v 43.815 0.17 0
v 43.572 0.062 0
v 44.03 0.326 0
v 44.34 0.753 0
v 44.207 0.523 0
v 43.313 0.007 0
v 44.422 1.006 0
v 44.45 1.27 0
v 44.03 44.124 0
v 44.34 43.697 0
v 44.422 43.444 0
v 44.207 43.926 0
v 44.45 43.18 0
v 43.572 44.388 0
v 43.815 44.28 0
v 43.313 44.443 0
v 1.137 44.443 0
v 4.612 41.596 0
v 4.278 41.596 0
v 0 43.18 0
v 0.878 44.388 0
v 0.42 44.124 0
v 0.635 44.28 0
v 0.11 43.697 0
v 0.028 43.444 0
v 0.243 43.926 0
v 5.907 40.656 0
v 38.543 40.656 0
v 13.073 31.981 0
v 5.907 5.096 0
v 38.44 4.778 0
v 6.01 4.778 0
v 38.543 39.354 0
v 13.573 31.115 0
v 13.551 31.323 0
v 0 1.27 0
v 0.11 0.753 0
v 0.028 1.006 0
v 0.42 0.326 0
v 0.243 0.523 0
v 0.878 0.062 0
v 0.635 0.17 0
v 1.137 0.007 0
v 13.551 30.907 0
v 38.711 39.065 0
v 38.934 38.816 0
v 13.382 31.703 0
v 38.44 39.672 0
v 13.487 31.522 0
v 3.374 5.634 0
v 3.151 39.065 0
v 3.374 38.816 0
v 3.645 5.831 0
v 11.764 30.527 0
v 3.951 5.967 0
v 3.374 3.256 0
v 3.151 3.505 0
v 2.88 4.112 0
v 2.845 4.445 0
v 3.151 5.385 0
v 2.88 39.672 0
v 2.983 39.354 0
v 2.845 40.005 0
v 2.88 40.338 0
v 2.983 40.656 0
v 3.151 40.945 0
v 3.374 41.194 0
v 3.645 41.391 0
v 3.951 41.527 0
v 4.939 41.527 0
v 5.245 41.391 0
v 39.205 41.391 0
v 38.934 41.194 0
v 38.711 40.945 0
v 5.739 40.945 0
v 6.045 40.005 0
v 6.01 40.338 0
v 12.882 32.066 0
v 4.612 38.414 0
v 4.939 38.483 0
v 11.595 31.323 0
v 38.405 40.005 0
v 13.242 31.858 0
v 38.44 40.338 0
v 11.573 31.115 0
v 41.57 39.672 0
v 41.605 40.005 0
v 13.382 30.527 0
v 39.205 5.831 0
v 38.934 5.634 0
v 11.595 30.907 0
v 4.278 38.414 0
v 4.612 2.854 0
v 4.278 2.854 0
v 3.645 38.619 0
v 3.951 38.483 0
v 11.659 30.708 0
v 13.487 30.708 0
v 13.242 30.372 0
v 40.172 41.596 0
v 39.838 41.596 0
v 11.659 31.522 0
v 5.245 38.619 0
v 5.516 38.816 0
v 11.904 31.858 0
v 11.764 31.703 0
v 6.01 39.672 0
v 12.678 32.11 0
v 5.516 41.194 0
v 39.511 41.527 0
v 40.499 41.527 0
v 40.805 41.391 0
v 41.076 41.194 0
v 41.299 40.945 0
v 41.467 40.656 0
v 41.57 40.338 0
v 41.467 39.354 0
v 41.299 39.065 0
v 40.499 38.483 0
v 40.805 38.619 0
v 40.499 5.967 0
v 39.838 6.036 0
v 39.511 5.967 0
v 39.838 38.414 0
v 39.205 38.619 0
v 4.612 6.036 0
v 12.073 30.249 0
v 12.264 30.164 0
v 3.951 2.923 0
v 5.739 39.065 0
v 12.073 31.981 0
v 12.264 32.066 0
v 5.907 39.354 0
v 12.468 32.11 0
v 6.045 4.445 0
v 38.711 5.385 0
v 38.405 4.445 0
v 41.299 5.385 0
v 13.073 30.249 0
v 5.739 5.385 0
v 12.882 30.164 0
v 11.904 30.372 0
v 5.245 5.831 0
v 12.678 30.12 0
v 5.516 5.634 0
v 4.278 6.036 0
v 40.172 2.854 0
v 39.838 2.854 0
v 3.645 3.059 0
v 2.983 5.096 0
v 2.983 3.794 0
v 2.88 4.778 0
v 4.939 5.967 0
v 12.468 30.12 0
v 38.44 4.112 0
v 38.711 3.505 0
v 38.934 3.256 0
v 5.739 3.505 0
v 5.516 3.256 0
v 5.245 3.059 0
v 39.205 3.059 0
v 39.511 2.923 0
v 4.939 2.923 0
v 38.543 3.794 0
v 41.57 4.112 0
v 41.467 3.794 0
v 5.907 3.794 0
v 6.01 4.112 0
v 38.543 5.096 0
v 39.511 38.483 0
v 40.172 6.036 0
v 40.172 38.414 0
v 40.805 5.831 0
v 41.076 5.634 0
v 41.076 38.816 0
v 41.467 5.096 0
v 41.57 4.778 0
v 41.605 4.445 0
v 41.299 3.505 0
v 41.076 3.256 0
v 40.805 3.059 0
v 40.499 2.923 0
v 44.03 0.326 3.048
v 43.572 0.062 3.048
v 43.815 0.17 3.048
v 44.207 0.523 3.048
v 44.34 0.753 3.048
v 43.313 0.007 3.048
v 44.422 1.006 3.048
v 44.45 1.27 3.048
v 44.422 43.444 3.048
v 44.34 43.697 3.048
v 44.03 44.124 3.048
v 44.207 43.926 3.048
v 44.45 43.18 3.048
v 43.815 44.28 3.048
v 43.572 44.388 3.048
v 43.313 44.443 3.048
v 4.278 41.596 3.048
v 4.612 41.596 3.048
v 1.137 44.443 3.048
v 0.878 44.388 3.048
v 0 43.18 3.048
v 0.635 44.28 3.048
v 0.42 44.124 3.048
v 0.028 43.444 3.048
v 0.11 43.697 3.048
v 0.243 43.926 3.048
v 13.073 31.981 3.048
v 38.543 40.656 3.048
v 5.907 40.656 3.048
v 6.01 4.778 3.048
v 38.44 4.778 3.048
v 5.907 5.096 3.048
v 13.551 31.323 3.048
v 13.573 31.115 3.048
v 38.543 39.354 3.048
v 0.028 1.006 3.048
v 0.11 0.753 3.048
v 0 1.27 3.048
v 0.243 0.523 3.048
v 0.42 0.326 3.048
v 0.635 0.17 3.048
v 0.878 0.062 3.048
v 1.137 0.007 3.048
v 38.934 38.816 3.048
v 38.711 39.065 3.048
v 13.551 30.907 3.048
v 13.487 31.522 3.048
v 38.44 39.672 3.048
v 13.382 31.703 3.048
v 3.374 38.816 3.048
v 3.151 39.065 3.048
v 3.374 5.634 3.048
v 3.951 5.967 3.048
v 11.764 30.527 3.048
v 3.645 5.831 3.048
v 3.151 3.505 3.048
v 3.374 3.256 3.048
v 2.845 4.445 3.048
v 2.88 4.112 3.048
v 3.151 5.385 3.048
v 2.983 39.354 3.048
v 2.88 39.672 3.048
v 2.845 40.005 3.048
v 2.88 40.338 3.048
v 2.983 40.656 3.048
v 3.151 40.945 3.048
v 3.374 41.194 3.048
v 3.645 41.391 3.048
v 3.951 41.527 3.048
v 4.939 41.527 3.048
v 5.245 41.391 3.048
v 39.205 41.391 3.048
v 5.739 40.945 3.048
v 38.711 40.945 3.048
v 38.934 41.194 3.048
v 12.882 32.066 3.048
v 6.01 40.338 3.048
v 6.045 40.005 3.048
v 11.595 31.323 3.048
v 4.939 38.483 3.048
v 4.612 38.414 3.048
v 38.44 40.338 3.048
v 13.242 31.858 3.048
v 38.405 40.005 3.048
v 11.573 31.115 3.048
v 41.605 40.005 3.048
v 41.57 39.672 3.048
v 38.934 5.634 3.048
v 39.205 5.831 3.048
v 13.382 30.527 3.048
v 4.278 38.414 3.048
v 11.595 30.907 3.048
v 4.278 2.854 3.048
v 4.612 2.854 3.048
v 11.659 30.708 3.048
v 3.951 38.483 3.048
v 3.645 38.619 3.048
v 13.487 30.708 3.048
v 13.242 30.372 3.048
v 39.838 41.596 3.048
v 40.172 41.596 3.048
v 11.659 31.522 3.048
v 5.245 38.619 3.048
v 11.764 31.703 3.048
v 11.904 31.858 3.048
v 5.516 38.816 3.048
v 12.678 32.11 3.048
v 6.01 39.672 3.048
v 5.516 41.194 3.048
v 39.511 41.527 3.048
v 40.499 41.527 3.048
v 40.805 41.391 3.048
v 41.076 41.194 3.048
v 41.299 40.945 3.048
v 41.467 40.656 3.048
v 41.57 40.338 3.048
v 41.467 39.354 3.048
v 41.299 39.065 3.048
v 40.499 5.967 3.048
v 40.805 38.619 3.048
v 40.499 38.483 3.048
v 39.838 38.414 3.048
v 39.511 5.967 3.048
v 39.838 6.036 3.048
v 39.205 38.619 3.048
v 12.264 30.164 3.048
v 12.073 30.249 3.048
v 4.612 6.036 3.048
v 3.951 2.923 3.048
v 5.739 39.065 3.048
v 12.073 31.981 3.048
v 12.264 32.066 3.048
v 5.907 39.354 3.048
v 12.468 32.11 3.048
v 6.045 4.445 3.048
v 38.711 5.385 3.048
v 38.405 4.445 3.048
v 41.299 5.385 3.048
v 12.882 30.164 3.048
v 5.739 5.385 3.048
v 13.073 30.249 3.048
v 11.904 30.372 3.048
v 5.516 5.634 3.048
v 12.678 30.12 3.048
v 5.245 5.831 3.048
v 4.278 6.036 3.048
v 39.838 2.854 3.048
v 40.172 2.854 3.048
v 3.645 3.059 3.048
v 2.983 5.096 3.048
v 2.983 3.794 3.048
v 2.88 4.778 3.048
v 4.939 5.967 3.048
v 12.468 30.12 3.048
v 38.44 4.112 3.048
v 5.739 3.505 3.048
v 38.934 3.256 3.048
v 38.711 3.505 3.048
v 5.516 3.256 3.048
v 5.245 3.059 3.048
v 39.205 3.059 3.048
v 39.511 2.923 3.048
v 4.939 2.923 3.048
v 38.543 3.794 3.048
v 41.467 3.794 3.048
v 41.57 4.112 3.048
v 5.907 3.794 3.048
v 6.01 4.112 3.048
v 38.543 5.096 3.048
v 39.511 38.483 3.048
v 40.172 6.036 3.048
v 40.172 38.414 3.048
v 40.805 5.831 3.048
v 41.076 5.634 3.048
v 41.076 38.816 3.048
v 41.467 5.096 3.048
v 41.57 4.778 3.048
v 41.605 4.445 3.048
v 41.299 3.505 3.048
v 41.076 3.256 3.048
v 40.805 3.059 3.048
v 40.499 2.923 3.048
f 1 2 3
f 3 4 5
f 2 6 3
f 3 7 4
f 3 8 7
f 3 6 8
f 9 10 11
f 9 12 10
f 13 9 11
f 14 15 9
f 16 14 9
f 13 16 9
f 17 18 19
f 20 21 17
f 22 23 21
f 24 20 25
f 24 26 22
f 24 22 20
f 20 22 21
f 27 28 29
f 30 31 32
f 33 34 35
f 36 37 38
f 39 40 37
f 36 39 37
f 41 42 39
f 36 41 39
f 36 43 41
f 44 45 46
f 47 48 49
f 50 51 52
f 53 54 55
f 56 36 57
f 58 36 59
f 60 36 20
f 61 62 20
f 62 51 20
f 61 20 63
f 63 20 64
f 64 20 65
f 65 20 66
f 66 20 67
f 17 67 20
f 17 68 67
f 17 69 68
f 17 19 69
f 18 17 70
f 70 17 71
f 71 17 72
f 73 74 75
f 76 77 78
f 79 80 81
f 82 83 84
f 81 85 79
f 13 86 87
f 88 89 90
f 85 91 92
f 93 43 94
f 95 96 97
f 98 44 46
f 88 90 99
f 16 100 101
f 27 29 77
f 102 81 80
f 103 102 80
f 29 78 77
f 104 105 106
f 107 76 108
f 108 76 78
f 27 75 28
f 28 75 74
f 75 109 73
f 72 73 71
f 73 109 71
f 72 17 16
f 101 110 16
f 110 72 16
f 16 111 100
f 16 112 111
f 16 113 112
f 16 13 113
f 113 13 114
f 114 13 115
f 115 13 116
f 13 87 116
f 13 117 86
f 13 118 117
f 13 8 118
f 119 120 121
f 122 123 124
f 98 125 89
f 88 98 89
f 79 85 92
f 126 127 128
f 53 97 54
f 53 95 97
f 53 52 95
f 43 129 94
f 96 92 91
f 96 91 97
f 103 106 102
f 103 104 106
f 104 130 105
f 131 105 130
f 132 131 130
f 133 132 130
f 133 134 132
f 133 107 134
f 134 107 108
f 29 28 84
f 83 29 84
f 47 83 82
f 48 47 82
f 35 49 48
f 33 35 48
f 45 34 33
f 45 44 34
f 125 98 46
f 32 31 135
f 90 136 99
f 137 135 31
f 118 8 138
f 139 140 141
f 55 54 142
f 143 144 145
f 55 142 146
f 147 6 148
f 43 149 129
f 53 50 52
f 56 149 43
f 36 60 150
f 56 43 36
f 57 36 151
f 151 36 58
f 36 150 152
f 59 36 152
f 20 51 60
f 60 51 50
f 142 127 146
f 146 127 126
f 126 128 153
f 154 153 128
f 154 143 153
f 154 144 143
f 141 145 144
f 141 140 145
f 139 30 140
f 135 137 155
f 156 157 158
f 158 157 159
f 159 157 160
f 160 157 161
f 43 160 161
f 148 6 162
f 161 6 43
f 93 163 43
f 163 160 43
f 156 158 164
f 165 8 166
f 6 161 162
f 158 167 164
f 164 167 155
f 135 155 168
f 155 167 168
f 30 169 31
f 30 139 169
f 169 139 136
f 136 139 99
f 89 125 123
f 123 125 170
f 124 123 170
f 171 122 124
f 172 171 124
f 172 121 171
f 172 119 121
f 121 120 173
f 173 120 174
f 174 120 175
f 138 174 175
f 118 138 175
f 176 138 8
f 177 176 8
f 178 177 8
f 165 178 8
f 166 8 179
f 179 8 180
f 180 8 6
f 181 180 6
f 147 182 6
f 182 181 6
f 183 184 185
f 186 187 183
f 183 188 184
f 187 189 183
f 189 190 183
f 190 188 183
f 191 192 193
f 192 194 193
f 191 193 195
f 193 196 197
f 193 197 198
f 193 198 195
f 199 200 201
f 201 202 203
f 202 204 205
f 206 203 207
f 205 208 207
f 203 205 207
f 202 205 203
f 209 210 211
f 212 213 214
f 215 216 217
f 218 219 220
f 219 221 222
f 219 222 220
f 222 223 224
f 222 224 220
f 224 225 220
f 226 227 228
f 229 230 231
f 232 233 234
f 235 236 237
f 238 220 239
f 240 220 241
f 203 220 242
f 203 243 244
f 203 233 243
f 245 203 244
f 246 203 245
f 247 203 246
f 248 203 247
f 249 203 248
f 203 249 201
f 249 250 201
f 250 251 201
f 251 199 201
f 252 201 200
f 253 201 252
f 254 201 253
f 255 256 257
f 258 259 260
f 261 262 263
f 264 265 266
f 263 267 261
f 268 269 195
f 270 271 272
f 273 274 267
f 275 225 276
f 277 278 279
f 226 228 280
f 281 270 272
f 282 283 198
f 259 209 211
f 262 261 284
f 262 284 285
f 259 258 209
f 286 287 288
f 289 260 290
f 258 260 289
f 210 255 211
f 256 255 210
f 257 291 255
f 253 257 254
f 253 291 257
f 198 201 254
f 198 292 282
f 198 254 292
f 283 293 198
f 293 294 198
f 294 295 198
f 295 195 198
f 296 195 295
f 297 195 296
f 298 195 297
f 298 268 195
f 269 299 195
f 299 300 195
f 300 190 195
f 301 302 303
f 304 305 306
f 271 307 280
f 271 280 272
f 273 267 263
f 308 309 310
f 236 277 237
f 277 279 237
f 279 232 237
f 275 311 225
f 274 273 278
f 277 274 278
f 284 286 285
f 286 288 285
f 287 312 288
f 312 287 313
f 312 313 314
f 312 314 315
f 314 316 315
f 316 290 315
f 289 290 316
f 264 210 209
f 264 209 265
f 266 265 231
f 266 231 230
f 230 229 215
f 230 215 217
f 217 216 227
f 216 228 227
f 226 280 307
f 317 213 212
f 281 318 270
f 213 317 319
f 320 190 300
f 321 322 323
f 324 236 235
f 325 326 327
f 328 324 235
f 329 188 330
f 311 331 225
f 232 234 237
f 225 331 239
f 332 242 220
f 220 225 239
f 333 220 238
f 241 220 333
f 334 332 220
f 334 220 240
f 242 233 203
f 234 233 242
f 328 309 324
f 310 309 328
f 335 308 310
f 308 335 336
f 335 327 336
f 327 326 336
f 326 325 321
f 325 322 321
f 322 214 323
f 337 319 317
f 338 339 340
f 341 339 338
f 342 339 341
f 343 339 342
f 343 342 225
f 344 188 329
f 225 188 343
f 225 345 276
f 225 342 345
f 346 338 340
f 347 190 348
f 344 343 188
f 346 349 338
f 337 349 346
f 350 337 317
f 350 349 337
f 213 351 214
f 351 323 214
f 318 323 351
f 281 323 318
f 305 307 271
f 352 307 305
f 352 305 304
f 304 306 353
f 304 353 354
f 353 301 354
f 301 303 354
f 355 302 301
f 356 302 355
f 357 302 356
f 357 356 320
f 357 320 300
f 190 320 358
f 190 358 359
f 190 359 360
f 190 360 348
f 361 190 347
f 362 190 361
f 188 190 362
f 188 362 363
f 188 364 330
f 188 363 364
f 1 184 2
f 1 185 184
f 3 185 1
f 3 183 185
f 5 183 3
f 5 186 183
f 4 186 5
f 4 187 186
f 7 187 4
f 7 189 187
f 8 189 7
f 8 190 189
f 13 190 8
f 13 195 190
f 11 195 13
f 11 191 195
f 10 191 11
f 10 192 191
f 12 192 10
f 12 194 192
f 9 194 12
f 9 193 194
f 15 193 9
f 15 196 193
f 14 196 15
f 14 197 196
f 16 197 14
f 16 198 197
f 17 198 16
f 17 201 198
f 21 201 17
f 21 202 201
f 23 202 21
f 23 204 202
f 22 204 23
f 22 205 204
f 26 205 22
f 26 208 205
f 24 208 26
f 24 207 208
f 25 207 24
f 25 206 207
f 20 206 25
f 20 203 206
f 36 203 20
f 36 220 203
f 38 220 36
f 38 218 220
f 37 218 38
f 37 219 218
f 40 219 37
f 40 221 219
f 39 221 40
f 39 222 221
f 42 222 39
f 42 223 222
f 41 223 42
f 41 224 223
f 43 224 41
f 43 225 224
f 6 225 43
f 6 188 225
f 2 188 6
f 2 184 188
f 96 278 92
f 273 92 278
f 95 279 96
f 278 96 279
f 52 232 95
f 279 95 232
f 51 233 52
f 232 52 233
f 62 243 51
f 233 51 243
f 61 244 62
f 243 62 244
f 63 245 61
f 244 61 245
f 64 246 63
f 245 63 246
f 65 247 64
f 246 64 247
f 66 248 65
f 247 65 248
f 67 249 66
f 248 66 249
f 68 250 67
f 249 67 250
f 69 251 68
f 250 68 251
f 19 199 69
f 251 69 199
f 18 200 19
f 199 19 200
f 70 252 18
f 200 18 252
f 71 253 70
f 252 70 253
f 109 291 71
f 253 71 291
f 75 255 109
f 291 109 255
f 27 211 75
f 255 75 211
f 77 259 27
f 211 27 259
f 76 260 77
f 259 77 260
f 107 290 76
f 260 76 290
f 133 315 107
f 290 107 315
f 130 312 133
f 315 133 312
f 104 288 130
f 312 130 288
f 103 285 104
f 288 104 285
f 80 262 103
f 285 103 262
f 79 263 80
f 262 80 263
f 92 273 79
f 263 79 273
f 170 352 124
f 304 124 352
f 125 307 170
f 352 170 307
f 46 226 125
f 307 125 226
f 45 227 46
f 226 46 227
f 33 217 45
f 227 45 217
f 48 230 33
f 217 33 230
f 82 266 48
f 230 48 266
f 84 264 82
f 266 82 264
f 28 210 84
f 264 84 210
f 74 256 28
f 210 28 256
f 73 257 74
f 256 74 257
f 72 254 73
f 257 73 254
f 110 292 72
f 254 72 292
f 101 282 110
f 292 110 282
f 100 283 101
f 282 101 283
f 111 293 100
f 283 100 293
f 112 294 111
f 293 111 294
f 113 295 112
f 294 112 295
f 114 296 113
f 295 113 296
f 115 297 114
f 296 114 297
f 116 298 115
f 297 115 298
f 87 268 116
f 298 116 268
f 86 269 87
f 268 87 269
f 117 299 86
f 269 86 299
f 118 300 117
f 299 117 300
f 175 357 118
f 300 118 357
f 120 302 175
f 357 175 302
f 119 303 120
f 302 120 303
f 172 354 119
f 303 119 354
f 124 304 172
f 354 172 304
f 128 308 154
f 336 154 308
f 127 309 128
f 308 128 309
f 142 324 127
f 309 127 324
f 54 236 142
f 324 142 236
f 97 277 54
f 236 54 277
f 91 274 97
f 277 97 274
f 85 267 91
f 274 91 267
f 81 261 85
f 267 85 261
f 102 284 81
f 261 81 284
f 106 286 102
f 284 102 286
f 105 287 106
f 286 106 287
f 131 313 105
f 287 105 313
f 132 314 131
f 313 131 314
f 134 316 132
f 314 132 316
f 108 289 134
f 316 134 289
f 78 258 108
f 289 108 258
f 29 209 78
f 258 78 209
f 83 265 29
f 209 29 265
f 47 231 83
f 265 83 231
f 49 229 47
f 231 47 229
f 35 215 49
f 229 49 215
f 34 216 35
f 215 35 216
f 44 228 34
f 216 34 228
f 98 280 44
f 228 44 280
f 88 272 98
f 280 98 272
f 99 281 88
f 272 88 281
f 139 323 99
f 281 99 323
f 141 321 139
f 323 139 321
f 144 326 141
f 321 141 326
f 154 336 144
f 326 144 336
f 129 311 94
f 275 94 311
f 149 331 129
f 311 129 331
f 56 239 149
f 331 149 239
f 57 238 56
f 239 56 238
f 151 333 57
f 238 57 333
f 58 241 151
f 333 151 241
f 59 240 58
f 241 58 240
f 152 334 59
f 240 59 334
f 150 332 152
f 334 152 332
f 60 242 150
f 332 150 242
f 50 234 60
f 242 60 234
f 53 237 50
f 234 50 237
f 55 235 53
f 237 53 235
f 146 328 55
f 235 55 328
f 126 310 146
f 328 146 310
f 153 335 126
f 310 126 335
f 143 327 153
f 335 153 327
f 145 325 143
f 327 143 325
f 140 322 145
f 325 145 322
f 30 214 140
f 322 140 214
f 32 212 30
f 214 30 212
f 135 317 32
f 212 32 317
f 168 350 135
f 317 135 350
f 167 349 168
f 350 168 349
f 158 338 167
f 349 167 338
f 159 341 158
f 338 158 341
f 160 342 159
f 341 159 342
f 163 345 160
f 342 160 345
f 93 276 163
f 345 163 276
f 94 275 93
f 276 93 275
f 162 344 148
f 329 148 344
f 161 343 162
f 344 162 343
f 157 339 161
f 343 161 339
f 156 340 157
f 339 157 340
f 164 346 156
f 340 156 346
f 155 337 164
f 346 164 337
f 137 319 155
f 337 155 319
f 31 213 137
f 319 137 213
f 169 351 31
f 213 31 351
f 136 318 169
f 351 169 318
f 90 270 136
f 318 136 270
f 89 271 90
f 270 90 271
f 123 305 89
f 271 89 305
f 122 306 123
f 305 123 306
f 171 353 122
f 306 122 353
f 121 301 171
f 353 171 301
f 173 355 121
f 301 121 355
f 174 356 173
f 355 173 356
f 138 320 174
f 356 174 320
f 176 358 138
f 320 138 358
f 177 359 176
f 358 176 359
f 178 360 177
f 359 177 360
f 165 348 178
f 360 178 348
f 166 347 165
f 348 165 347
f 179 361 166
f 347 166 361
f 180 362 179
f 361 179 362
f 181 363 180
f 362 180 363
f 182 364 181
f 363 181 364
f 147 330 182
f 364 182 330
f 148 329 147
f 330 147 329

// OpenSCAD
$fs = 0.1;

mm = 1;
inch = 25.4 * mm;

WIDTH = 1.75 * inch;
HEIGHT = 1.75 * inch;
DEPTH = 0.12 * inch;
EDGE_RADIUS = 1.27 * mm;

HOLE_INSET = 0.175 * inch;
HOLE_RADIUS = 3.2 * mm / 2;

BUTTON_POS = [ 0.495 * inch, 1.225 * inch ];
BUTTON_RADIUS = 1 * mm;

module front_cover()
{
    color([ 1, 1, 1 ], alpha = 0.5) linear_extrude(height = DEPTH) difference()
    {
        hull()
        {
            translate([ EDGE_RADIUS, EDGE_RADIUS ]) circle(r = EDGE_RADIUS);
            translate([ WIDTH - EDGE_RADIUS, EDGE_RADIUS ]) circle(r = EDGE_RADIUS);
            translate([ EDGE_RADIUS, HEIGHT - EDGE_RADIUS ]) circle(r = EDGE_RADIUS);
            translate([ WIDTH - EDGE_RADIUS, HEIGHT - EDGE_RADIUS ]) circle(r = EDGE_RADIUS);
        }

        translate([ HOLE_INSET, HOLE_INSET ]) circle(r = HOLE_RADIUS);
        translate([ WIDTH - HOLE_INSET, HOLE_INSET ]) circle(r = HOLE_RADIUS);
        translate([ HOLE_INSET, HEIGHT - HOLE_INSET ]) circle(r = HOLE_RADIUS);
        translate([ WIDTH - HOLE_INSET, HEIGHT - HOLE_INSET ]) circle(r = HOLE_RADIUS);

        translate(BUTTON_POS) circle(r = BUTTON_RADIUS);
    }
}

front_cover();
